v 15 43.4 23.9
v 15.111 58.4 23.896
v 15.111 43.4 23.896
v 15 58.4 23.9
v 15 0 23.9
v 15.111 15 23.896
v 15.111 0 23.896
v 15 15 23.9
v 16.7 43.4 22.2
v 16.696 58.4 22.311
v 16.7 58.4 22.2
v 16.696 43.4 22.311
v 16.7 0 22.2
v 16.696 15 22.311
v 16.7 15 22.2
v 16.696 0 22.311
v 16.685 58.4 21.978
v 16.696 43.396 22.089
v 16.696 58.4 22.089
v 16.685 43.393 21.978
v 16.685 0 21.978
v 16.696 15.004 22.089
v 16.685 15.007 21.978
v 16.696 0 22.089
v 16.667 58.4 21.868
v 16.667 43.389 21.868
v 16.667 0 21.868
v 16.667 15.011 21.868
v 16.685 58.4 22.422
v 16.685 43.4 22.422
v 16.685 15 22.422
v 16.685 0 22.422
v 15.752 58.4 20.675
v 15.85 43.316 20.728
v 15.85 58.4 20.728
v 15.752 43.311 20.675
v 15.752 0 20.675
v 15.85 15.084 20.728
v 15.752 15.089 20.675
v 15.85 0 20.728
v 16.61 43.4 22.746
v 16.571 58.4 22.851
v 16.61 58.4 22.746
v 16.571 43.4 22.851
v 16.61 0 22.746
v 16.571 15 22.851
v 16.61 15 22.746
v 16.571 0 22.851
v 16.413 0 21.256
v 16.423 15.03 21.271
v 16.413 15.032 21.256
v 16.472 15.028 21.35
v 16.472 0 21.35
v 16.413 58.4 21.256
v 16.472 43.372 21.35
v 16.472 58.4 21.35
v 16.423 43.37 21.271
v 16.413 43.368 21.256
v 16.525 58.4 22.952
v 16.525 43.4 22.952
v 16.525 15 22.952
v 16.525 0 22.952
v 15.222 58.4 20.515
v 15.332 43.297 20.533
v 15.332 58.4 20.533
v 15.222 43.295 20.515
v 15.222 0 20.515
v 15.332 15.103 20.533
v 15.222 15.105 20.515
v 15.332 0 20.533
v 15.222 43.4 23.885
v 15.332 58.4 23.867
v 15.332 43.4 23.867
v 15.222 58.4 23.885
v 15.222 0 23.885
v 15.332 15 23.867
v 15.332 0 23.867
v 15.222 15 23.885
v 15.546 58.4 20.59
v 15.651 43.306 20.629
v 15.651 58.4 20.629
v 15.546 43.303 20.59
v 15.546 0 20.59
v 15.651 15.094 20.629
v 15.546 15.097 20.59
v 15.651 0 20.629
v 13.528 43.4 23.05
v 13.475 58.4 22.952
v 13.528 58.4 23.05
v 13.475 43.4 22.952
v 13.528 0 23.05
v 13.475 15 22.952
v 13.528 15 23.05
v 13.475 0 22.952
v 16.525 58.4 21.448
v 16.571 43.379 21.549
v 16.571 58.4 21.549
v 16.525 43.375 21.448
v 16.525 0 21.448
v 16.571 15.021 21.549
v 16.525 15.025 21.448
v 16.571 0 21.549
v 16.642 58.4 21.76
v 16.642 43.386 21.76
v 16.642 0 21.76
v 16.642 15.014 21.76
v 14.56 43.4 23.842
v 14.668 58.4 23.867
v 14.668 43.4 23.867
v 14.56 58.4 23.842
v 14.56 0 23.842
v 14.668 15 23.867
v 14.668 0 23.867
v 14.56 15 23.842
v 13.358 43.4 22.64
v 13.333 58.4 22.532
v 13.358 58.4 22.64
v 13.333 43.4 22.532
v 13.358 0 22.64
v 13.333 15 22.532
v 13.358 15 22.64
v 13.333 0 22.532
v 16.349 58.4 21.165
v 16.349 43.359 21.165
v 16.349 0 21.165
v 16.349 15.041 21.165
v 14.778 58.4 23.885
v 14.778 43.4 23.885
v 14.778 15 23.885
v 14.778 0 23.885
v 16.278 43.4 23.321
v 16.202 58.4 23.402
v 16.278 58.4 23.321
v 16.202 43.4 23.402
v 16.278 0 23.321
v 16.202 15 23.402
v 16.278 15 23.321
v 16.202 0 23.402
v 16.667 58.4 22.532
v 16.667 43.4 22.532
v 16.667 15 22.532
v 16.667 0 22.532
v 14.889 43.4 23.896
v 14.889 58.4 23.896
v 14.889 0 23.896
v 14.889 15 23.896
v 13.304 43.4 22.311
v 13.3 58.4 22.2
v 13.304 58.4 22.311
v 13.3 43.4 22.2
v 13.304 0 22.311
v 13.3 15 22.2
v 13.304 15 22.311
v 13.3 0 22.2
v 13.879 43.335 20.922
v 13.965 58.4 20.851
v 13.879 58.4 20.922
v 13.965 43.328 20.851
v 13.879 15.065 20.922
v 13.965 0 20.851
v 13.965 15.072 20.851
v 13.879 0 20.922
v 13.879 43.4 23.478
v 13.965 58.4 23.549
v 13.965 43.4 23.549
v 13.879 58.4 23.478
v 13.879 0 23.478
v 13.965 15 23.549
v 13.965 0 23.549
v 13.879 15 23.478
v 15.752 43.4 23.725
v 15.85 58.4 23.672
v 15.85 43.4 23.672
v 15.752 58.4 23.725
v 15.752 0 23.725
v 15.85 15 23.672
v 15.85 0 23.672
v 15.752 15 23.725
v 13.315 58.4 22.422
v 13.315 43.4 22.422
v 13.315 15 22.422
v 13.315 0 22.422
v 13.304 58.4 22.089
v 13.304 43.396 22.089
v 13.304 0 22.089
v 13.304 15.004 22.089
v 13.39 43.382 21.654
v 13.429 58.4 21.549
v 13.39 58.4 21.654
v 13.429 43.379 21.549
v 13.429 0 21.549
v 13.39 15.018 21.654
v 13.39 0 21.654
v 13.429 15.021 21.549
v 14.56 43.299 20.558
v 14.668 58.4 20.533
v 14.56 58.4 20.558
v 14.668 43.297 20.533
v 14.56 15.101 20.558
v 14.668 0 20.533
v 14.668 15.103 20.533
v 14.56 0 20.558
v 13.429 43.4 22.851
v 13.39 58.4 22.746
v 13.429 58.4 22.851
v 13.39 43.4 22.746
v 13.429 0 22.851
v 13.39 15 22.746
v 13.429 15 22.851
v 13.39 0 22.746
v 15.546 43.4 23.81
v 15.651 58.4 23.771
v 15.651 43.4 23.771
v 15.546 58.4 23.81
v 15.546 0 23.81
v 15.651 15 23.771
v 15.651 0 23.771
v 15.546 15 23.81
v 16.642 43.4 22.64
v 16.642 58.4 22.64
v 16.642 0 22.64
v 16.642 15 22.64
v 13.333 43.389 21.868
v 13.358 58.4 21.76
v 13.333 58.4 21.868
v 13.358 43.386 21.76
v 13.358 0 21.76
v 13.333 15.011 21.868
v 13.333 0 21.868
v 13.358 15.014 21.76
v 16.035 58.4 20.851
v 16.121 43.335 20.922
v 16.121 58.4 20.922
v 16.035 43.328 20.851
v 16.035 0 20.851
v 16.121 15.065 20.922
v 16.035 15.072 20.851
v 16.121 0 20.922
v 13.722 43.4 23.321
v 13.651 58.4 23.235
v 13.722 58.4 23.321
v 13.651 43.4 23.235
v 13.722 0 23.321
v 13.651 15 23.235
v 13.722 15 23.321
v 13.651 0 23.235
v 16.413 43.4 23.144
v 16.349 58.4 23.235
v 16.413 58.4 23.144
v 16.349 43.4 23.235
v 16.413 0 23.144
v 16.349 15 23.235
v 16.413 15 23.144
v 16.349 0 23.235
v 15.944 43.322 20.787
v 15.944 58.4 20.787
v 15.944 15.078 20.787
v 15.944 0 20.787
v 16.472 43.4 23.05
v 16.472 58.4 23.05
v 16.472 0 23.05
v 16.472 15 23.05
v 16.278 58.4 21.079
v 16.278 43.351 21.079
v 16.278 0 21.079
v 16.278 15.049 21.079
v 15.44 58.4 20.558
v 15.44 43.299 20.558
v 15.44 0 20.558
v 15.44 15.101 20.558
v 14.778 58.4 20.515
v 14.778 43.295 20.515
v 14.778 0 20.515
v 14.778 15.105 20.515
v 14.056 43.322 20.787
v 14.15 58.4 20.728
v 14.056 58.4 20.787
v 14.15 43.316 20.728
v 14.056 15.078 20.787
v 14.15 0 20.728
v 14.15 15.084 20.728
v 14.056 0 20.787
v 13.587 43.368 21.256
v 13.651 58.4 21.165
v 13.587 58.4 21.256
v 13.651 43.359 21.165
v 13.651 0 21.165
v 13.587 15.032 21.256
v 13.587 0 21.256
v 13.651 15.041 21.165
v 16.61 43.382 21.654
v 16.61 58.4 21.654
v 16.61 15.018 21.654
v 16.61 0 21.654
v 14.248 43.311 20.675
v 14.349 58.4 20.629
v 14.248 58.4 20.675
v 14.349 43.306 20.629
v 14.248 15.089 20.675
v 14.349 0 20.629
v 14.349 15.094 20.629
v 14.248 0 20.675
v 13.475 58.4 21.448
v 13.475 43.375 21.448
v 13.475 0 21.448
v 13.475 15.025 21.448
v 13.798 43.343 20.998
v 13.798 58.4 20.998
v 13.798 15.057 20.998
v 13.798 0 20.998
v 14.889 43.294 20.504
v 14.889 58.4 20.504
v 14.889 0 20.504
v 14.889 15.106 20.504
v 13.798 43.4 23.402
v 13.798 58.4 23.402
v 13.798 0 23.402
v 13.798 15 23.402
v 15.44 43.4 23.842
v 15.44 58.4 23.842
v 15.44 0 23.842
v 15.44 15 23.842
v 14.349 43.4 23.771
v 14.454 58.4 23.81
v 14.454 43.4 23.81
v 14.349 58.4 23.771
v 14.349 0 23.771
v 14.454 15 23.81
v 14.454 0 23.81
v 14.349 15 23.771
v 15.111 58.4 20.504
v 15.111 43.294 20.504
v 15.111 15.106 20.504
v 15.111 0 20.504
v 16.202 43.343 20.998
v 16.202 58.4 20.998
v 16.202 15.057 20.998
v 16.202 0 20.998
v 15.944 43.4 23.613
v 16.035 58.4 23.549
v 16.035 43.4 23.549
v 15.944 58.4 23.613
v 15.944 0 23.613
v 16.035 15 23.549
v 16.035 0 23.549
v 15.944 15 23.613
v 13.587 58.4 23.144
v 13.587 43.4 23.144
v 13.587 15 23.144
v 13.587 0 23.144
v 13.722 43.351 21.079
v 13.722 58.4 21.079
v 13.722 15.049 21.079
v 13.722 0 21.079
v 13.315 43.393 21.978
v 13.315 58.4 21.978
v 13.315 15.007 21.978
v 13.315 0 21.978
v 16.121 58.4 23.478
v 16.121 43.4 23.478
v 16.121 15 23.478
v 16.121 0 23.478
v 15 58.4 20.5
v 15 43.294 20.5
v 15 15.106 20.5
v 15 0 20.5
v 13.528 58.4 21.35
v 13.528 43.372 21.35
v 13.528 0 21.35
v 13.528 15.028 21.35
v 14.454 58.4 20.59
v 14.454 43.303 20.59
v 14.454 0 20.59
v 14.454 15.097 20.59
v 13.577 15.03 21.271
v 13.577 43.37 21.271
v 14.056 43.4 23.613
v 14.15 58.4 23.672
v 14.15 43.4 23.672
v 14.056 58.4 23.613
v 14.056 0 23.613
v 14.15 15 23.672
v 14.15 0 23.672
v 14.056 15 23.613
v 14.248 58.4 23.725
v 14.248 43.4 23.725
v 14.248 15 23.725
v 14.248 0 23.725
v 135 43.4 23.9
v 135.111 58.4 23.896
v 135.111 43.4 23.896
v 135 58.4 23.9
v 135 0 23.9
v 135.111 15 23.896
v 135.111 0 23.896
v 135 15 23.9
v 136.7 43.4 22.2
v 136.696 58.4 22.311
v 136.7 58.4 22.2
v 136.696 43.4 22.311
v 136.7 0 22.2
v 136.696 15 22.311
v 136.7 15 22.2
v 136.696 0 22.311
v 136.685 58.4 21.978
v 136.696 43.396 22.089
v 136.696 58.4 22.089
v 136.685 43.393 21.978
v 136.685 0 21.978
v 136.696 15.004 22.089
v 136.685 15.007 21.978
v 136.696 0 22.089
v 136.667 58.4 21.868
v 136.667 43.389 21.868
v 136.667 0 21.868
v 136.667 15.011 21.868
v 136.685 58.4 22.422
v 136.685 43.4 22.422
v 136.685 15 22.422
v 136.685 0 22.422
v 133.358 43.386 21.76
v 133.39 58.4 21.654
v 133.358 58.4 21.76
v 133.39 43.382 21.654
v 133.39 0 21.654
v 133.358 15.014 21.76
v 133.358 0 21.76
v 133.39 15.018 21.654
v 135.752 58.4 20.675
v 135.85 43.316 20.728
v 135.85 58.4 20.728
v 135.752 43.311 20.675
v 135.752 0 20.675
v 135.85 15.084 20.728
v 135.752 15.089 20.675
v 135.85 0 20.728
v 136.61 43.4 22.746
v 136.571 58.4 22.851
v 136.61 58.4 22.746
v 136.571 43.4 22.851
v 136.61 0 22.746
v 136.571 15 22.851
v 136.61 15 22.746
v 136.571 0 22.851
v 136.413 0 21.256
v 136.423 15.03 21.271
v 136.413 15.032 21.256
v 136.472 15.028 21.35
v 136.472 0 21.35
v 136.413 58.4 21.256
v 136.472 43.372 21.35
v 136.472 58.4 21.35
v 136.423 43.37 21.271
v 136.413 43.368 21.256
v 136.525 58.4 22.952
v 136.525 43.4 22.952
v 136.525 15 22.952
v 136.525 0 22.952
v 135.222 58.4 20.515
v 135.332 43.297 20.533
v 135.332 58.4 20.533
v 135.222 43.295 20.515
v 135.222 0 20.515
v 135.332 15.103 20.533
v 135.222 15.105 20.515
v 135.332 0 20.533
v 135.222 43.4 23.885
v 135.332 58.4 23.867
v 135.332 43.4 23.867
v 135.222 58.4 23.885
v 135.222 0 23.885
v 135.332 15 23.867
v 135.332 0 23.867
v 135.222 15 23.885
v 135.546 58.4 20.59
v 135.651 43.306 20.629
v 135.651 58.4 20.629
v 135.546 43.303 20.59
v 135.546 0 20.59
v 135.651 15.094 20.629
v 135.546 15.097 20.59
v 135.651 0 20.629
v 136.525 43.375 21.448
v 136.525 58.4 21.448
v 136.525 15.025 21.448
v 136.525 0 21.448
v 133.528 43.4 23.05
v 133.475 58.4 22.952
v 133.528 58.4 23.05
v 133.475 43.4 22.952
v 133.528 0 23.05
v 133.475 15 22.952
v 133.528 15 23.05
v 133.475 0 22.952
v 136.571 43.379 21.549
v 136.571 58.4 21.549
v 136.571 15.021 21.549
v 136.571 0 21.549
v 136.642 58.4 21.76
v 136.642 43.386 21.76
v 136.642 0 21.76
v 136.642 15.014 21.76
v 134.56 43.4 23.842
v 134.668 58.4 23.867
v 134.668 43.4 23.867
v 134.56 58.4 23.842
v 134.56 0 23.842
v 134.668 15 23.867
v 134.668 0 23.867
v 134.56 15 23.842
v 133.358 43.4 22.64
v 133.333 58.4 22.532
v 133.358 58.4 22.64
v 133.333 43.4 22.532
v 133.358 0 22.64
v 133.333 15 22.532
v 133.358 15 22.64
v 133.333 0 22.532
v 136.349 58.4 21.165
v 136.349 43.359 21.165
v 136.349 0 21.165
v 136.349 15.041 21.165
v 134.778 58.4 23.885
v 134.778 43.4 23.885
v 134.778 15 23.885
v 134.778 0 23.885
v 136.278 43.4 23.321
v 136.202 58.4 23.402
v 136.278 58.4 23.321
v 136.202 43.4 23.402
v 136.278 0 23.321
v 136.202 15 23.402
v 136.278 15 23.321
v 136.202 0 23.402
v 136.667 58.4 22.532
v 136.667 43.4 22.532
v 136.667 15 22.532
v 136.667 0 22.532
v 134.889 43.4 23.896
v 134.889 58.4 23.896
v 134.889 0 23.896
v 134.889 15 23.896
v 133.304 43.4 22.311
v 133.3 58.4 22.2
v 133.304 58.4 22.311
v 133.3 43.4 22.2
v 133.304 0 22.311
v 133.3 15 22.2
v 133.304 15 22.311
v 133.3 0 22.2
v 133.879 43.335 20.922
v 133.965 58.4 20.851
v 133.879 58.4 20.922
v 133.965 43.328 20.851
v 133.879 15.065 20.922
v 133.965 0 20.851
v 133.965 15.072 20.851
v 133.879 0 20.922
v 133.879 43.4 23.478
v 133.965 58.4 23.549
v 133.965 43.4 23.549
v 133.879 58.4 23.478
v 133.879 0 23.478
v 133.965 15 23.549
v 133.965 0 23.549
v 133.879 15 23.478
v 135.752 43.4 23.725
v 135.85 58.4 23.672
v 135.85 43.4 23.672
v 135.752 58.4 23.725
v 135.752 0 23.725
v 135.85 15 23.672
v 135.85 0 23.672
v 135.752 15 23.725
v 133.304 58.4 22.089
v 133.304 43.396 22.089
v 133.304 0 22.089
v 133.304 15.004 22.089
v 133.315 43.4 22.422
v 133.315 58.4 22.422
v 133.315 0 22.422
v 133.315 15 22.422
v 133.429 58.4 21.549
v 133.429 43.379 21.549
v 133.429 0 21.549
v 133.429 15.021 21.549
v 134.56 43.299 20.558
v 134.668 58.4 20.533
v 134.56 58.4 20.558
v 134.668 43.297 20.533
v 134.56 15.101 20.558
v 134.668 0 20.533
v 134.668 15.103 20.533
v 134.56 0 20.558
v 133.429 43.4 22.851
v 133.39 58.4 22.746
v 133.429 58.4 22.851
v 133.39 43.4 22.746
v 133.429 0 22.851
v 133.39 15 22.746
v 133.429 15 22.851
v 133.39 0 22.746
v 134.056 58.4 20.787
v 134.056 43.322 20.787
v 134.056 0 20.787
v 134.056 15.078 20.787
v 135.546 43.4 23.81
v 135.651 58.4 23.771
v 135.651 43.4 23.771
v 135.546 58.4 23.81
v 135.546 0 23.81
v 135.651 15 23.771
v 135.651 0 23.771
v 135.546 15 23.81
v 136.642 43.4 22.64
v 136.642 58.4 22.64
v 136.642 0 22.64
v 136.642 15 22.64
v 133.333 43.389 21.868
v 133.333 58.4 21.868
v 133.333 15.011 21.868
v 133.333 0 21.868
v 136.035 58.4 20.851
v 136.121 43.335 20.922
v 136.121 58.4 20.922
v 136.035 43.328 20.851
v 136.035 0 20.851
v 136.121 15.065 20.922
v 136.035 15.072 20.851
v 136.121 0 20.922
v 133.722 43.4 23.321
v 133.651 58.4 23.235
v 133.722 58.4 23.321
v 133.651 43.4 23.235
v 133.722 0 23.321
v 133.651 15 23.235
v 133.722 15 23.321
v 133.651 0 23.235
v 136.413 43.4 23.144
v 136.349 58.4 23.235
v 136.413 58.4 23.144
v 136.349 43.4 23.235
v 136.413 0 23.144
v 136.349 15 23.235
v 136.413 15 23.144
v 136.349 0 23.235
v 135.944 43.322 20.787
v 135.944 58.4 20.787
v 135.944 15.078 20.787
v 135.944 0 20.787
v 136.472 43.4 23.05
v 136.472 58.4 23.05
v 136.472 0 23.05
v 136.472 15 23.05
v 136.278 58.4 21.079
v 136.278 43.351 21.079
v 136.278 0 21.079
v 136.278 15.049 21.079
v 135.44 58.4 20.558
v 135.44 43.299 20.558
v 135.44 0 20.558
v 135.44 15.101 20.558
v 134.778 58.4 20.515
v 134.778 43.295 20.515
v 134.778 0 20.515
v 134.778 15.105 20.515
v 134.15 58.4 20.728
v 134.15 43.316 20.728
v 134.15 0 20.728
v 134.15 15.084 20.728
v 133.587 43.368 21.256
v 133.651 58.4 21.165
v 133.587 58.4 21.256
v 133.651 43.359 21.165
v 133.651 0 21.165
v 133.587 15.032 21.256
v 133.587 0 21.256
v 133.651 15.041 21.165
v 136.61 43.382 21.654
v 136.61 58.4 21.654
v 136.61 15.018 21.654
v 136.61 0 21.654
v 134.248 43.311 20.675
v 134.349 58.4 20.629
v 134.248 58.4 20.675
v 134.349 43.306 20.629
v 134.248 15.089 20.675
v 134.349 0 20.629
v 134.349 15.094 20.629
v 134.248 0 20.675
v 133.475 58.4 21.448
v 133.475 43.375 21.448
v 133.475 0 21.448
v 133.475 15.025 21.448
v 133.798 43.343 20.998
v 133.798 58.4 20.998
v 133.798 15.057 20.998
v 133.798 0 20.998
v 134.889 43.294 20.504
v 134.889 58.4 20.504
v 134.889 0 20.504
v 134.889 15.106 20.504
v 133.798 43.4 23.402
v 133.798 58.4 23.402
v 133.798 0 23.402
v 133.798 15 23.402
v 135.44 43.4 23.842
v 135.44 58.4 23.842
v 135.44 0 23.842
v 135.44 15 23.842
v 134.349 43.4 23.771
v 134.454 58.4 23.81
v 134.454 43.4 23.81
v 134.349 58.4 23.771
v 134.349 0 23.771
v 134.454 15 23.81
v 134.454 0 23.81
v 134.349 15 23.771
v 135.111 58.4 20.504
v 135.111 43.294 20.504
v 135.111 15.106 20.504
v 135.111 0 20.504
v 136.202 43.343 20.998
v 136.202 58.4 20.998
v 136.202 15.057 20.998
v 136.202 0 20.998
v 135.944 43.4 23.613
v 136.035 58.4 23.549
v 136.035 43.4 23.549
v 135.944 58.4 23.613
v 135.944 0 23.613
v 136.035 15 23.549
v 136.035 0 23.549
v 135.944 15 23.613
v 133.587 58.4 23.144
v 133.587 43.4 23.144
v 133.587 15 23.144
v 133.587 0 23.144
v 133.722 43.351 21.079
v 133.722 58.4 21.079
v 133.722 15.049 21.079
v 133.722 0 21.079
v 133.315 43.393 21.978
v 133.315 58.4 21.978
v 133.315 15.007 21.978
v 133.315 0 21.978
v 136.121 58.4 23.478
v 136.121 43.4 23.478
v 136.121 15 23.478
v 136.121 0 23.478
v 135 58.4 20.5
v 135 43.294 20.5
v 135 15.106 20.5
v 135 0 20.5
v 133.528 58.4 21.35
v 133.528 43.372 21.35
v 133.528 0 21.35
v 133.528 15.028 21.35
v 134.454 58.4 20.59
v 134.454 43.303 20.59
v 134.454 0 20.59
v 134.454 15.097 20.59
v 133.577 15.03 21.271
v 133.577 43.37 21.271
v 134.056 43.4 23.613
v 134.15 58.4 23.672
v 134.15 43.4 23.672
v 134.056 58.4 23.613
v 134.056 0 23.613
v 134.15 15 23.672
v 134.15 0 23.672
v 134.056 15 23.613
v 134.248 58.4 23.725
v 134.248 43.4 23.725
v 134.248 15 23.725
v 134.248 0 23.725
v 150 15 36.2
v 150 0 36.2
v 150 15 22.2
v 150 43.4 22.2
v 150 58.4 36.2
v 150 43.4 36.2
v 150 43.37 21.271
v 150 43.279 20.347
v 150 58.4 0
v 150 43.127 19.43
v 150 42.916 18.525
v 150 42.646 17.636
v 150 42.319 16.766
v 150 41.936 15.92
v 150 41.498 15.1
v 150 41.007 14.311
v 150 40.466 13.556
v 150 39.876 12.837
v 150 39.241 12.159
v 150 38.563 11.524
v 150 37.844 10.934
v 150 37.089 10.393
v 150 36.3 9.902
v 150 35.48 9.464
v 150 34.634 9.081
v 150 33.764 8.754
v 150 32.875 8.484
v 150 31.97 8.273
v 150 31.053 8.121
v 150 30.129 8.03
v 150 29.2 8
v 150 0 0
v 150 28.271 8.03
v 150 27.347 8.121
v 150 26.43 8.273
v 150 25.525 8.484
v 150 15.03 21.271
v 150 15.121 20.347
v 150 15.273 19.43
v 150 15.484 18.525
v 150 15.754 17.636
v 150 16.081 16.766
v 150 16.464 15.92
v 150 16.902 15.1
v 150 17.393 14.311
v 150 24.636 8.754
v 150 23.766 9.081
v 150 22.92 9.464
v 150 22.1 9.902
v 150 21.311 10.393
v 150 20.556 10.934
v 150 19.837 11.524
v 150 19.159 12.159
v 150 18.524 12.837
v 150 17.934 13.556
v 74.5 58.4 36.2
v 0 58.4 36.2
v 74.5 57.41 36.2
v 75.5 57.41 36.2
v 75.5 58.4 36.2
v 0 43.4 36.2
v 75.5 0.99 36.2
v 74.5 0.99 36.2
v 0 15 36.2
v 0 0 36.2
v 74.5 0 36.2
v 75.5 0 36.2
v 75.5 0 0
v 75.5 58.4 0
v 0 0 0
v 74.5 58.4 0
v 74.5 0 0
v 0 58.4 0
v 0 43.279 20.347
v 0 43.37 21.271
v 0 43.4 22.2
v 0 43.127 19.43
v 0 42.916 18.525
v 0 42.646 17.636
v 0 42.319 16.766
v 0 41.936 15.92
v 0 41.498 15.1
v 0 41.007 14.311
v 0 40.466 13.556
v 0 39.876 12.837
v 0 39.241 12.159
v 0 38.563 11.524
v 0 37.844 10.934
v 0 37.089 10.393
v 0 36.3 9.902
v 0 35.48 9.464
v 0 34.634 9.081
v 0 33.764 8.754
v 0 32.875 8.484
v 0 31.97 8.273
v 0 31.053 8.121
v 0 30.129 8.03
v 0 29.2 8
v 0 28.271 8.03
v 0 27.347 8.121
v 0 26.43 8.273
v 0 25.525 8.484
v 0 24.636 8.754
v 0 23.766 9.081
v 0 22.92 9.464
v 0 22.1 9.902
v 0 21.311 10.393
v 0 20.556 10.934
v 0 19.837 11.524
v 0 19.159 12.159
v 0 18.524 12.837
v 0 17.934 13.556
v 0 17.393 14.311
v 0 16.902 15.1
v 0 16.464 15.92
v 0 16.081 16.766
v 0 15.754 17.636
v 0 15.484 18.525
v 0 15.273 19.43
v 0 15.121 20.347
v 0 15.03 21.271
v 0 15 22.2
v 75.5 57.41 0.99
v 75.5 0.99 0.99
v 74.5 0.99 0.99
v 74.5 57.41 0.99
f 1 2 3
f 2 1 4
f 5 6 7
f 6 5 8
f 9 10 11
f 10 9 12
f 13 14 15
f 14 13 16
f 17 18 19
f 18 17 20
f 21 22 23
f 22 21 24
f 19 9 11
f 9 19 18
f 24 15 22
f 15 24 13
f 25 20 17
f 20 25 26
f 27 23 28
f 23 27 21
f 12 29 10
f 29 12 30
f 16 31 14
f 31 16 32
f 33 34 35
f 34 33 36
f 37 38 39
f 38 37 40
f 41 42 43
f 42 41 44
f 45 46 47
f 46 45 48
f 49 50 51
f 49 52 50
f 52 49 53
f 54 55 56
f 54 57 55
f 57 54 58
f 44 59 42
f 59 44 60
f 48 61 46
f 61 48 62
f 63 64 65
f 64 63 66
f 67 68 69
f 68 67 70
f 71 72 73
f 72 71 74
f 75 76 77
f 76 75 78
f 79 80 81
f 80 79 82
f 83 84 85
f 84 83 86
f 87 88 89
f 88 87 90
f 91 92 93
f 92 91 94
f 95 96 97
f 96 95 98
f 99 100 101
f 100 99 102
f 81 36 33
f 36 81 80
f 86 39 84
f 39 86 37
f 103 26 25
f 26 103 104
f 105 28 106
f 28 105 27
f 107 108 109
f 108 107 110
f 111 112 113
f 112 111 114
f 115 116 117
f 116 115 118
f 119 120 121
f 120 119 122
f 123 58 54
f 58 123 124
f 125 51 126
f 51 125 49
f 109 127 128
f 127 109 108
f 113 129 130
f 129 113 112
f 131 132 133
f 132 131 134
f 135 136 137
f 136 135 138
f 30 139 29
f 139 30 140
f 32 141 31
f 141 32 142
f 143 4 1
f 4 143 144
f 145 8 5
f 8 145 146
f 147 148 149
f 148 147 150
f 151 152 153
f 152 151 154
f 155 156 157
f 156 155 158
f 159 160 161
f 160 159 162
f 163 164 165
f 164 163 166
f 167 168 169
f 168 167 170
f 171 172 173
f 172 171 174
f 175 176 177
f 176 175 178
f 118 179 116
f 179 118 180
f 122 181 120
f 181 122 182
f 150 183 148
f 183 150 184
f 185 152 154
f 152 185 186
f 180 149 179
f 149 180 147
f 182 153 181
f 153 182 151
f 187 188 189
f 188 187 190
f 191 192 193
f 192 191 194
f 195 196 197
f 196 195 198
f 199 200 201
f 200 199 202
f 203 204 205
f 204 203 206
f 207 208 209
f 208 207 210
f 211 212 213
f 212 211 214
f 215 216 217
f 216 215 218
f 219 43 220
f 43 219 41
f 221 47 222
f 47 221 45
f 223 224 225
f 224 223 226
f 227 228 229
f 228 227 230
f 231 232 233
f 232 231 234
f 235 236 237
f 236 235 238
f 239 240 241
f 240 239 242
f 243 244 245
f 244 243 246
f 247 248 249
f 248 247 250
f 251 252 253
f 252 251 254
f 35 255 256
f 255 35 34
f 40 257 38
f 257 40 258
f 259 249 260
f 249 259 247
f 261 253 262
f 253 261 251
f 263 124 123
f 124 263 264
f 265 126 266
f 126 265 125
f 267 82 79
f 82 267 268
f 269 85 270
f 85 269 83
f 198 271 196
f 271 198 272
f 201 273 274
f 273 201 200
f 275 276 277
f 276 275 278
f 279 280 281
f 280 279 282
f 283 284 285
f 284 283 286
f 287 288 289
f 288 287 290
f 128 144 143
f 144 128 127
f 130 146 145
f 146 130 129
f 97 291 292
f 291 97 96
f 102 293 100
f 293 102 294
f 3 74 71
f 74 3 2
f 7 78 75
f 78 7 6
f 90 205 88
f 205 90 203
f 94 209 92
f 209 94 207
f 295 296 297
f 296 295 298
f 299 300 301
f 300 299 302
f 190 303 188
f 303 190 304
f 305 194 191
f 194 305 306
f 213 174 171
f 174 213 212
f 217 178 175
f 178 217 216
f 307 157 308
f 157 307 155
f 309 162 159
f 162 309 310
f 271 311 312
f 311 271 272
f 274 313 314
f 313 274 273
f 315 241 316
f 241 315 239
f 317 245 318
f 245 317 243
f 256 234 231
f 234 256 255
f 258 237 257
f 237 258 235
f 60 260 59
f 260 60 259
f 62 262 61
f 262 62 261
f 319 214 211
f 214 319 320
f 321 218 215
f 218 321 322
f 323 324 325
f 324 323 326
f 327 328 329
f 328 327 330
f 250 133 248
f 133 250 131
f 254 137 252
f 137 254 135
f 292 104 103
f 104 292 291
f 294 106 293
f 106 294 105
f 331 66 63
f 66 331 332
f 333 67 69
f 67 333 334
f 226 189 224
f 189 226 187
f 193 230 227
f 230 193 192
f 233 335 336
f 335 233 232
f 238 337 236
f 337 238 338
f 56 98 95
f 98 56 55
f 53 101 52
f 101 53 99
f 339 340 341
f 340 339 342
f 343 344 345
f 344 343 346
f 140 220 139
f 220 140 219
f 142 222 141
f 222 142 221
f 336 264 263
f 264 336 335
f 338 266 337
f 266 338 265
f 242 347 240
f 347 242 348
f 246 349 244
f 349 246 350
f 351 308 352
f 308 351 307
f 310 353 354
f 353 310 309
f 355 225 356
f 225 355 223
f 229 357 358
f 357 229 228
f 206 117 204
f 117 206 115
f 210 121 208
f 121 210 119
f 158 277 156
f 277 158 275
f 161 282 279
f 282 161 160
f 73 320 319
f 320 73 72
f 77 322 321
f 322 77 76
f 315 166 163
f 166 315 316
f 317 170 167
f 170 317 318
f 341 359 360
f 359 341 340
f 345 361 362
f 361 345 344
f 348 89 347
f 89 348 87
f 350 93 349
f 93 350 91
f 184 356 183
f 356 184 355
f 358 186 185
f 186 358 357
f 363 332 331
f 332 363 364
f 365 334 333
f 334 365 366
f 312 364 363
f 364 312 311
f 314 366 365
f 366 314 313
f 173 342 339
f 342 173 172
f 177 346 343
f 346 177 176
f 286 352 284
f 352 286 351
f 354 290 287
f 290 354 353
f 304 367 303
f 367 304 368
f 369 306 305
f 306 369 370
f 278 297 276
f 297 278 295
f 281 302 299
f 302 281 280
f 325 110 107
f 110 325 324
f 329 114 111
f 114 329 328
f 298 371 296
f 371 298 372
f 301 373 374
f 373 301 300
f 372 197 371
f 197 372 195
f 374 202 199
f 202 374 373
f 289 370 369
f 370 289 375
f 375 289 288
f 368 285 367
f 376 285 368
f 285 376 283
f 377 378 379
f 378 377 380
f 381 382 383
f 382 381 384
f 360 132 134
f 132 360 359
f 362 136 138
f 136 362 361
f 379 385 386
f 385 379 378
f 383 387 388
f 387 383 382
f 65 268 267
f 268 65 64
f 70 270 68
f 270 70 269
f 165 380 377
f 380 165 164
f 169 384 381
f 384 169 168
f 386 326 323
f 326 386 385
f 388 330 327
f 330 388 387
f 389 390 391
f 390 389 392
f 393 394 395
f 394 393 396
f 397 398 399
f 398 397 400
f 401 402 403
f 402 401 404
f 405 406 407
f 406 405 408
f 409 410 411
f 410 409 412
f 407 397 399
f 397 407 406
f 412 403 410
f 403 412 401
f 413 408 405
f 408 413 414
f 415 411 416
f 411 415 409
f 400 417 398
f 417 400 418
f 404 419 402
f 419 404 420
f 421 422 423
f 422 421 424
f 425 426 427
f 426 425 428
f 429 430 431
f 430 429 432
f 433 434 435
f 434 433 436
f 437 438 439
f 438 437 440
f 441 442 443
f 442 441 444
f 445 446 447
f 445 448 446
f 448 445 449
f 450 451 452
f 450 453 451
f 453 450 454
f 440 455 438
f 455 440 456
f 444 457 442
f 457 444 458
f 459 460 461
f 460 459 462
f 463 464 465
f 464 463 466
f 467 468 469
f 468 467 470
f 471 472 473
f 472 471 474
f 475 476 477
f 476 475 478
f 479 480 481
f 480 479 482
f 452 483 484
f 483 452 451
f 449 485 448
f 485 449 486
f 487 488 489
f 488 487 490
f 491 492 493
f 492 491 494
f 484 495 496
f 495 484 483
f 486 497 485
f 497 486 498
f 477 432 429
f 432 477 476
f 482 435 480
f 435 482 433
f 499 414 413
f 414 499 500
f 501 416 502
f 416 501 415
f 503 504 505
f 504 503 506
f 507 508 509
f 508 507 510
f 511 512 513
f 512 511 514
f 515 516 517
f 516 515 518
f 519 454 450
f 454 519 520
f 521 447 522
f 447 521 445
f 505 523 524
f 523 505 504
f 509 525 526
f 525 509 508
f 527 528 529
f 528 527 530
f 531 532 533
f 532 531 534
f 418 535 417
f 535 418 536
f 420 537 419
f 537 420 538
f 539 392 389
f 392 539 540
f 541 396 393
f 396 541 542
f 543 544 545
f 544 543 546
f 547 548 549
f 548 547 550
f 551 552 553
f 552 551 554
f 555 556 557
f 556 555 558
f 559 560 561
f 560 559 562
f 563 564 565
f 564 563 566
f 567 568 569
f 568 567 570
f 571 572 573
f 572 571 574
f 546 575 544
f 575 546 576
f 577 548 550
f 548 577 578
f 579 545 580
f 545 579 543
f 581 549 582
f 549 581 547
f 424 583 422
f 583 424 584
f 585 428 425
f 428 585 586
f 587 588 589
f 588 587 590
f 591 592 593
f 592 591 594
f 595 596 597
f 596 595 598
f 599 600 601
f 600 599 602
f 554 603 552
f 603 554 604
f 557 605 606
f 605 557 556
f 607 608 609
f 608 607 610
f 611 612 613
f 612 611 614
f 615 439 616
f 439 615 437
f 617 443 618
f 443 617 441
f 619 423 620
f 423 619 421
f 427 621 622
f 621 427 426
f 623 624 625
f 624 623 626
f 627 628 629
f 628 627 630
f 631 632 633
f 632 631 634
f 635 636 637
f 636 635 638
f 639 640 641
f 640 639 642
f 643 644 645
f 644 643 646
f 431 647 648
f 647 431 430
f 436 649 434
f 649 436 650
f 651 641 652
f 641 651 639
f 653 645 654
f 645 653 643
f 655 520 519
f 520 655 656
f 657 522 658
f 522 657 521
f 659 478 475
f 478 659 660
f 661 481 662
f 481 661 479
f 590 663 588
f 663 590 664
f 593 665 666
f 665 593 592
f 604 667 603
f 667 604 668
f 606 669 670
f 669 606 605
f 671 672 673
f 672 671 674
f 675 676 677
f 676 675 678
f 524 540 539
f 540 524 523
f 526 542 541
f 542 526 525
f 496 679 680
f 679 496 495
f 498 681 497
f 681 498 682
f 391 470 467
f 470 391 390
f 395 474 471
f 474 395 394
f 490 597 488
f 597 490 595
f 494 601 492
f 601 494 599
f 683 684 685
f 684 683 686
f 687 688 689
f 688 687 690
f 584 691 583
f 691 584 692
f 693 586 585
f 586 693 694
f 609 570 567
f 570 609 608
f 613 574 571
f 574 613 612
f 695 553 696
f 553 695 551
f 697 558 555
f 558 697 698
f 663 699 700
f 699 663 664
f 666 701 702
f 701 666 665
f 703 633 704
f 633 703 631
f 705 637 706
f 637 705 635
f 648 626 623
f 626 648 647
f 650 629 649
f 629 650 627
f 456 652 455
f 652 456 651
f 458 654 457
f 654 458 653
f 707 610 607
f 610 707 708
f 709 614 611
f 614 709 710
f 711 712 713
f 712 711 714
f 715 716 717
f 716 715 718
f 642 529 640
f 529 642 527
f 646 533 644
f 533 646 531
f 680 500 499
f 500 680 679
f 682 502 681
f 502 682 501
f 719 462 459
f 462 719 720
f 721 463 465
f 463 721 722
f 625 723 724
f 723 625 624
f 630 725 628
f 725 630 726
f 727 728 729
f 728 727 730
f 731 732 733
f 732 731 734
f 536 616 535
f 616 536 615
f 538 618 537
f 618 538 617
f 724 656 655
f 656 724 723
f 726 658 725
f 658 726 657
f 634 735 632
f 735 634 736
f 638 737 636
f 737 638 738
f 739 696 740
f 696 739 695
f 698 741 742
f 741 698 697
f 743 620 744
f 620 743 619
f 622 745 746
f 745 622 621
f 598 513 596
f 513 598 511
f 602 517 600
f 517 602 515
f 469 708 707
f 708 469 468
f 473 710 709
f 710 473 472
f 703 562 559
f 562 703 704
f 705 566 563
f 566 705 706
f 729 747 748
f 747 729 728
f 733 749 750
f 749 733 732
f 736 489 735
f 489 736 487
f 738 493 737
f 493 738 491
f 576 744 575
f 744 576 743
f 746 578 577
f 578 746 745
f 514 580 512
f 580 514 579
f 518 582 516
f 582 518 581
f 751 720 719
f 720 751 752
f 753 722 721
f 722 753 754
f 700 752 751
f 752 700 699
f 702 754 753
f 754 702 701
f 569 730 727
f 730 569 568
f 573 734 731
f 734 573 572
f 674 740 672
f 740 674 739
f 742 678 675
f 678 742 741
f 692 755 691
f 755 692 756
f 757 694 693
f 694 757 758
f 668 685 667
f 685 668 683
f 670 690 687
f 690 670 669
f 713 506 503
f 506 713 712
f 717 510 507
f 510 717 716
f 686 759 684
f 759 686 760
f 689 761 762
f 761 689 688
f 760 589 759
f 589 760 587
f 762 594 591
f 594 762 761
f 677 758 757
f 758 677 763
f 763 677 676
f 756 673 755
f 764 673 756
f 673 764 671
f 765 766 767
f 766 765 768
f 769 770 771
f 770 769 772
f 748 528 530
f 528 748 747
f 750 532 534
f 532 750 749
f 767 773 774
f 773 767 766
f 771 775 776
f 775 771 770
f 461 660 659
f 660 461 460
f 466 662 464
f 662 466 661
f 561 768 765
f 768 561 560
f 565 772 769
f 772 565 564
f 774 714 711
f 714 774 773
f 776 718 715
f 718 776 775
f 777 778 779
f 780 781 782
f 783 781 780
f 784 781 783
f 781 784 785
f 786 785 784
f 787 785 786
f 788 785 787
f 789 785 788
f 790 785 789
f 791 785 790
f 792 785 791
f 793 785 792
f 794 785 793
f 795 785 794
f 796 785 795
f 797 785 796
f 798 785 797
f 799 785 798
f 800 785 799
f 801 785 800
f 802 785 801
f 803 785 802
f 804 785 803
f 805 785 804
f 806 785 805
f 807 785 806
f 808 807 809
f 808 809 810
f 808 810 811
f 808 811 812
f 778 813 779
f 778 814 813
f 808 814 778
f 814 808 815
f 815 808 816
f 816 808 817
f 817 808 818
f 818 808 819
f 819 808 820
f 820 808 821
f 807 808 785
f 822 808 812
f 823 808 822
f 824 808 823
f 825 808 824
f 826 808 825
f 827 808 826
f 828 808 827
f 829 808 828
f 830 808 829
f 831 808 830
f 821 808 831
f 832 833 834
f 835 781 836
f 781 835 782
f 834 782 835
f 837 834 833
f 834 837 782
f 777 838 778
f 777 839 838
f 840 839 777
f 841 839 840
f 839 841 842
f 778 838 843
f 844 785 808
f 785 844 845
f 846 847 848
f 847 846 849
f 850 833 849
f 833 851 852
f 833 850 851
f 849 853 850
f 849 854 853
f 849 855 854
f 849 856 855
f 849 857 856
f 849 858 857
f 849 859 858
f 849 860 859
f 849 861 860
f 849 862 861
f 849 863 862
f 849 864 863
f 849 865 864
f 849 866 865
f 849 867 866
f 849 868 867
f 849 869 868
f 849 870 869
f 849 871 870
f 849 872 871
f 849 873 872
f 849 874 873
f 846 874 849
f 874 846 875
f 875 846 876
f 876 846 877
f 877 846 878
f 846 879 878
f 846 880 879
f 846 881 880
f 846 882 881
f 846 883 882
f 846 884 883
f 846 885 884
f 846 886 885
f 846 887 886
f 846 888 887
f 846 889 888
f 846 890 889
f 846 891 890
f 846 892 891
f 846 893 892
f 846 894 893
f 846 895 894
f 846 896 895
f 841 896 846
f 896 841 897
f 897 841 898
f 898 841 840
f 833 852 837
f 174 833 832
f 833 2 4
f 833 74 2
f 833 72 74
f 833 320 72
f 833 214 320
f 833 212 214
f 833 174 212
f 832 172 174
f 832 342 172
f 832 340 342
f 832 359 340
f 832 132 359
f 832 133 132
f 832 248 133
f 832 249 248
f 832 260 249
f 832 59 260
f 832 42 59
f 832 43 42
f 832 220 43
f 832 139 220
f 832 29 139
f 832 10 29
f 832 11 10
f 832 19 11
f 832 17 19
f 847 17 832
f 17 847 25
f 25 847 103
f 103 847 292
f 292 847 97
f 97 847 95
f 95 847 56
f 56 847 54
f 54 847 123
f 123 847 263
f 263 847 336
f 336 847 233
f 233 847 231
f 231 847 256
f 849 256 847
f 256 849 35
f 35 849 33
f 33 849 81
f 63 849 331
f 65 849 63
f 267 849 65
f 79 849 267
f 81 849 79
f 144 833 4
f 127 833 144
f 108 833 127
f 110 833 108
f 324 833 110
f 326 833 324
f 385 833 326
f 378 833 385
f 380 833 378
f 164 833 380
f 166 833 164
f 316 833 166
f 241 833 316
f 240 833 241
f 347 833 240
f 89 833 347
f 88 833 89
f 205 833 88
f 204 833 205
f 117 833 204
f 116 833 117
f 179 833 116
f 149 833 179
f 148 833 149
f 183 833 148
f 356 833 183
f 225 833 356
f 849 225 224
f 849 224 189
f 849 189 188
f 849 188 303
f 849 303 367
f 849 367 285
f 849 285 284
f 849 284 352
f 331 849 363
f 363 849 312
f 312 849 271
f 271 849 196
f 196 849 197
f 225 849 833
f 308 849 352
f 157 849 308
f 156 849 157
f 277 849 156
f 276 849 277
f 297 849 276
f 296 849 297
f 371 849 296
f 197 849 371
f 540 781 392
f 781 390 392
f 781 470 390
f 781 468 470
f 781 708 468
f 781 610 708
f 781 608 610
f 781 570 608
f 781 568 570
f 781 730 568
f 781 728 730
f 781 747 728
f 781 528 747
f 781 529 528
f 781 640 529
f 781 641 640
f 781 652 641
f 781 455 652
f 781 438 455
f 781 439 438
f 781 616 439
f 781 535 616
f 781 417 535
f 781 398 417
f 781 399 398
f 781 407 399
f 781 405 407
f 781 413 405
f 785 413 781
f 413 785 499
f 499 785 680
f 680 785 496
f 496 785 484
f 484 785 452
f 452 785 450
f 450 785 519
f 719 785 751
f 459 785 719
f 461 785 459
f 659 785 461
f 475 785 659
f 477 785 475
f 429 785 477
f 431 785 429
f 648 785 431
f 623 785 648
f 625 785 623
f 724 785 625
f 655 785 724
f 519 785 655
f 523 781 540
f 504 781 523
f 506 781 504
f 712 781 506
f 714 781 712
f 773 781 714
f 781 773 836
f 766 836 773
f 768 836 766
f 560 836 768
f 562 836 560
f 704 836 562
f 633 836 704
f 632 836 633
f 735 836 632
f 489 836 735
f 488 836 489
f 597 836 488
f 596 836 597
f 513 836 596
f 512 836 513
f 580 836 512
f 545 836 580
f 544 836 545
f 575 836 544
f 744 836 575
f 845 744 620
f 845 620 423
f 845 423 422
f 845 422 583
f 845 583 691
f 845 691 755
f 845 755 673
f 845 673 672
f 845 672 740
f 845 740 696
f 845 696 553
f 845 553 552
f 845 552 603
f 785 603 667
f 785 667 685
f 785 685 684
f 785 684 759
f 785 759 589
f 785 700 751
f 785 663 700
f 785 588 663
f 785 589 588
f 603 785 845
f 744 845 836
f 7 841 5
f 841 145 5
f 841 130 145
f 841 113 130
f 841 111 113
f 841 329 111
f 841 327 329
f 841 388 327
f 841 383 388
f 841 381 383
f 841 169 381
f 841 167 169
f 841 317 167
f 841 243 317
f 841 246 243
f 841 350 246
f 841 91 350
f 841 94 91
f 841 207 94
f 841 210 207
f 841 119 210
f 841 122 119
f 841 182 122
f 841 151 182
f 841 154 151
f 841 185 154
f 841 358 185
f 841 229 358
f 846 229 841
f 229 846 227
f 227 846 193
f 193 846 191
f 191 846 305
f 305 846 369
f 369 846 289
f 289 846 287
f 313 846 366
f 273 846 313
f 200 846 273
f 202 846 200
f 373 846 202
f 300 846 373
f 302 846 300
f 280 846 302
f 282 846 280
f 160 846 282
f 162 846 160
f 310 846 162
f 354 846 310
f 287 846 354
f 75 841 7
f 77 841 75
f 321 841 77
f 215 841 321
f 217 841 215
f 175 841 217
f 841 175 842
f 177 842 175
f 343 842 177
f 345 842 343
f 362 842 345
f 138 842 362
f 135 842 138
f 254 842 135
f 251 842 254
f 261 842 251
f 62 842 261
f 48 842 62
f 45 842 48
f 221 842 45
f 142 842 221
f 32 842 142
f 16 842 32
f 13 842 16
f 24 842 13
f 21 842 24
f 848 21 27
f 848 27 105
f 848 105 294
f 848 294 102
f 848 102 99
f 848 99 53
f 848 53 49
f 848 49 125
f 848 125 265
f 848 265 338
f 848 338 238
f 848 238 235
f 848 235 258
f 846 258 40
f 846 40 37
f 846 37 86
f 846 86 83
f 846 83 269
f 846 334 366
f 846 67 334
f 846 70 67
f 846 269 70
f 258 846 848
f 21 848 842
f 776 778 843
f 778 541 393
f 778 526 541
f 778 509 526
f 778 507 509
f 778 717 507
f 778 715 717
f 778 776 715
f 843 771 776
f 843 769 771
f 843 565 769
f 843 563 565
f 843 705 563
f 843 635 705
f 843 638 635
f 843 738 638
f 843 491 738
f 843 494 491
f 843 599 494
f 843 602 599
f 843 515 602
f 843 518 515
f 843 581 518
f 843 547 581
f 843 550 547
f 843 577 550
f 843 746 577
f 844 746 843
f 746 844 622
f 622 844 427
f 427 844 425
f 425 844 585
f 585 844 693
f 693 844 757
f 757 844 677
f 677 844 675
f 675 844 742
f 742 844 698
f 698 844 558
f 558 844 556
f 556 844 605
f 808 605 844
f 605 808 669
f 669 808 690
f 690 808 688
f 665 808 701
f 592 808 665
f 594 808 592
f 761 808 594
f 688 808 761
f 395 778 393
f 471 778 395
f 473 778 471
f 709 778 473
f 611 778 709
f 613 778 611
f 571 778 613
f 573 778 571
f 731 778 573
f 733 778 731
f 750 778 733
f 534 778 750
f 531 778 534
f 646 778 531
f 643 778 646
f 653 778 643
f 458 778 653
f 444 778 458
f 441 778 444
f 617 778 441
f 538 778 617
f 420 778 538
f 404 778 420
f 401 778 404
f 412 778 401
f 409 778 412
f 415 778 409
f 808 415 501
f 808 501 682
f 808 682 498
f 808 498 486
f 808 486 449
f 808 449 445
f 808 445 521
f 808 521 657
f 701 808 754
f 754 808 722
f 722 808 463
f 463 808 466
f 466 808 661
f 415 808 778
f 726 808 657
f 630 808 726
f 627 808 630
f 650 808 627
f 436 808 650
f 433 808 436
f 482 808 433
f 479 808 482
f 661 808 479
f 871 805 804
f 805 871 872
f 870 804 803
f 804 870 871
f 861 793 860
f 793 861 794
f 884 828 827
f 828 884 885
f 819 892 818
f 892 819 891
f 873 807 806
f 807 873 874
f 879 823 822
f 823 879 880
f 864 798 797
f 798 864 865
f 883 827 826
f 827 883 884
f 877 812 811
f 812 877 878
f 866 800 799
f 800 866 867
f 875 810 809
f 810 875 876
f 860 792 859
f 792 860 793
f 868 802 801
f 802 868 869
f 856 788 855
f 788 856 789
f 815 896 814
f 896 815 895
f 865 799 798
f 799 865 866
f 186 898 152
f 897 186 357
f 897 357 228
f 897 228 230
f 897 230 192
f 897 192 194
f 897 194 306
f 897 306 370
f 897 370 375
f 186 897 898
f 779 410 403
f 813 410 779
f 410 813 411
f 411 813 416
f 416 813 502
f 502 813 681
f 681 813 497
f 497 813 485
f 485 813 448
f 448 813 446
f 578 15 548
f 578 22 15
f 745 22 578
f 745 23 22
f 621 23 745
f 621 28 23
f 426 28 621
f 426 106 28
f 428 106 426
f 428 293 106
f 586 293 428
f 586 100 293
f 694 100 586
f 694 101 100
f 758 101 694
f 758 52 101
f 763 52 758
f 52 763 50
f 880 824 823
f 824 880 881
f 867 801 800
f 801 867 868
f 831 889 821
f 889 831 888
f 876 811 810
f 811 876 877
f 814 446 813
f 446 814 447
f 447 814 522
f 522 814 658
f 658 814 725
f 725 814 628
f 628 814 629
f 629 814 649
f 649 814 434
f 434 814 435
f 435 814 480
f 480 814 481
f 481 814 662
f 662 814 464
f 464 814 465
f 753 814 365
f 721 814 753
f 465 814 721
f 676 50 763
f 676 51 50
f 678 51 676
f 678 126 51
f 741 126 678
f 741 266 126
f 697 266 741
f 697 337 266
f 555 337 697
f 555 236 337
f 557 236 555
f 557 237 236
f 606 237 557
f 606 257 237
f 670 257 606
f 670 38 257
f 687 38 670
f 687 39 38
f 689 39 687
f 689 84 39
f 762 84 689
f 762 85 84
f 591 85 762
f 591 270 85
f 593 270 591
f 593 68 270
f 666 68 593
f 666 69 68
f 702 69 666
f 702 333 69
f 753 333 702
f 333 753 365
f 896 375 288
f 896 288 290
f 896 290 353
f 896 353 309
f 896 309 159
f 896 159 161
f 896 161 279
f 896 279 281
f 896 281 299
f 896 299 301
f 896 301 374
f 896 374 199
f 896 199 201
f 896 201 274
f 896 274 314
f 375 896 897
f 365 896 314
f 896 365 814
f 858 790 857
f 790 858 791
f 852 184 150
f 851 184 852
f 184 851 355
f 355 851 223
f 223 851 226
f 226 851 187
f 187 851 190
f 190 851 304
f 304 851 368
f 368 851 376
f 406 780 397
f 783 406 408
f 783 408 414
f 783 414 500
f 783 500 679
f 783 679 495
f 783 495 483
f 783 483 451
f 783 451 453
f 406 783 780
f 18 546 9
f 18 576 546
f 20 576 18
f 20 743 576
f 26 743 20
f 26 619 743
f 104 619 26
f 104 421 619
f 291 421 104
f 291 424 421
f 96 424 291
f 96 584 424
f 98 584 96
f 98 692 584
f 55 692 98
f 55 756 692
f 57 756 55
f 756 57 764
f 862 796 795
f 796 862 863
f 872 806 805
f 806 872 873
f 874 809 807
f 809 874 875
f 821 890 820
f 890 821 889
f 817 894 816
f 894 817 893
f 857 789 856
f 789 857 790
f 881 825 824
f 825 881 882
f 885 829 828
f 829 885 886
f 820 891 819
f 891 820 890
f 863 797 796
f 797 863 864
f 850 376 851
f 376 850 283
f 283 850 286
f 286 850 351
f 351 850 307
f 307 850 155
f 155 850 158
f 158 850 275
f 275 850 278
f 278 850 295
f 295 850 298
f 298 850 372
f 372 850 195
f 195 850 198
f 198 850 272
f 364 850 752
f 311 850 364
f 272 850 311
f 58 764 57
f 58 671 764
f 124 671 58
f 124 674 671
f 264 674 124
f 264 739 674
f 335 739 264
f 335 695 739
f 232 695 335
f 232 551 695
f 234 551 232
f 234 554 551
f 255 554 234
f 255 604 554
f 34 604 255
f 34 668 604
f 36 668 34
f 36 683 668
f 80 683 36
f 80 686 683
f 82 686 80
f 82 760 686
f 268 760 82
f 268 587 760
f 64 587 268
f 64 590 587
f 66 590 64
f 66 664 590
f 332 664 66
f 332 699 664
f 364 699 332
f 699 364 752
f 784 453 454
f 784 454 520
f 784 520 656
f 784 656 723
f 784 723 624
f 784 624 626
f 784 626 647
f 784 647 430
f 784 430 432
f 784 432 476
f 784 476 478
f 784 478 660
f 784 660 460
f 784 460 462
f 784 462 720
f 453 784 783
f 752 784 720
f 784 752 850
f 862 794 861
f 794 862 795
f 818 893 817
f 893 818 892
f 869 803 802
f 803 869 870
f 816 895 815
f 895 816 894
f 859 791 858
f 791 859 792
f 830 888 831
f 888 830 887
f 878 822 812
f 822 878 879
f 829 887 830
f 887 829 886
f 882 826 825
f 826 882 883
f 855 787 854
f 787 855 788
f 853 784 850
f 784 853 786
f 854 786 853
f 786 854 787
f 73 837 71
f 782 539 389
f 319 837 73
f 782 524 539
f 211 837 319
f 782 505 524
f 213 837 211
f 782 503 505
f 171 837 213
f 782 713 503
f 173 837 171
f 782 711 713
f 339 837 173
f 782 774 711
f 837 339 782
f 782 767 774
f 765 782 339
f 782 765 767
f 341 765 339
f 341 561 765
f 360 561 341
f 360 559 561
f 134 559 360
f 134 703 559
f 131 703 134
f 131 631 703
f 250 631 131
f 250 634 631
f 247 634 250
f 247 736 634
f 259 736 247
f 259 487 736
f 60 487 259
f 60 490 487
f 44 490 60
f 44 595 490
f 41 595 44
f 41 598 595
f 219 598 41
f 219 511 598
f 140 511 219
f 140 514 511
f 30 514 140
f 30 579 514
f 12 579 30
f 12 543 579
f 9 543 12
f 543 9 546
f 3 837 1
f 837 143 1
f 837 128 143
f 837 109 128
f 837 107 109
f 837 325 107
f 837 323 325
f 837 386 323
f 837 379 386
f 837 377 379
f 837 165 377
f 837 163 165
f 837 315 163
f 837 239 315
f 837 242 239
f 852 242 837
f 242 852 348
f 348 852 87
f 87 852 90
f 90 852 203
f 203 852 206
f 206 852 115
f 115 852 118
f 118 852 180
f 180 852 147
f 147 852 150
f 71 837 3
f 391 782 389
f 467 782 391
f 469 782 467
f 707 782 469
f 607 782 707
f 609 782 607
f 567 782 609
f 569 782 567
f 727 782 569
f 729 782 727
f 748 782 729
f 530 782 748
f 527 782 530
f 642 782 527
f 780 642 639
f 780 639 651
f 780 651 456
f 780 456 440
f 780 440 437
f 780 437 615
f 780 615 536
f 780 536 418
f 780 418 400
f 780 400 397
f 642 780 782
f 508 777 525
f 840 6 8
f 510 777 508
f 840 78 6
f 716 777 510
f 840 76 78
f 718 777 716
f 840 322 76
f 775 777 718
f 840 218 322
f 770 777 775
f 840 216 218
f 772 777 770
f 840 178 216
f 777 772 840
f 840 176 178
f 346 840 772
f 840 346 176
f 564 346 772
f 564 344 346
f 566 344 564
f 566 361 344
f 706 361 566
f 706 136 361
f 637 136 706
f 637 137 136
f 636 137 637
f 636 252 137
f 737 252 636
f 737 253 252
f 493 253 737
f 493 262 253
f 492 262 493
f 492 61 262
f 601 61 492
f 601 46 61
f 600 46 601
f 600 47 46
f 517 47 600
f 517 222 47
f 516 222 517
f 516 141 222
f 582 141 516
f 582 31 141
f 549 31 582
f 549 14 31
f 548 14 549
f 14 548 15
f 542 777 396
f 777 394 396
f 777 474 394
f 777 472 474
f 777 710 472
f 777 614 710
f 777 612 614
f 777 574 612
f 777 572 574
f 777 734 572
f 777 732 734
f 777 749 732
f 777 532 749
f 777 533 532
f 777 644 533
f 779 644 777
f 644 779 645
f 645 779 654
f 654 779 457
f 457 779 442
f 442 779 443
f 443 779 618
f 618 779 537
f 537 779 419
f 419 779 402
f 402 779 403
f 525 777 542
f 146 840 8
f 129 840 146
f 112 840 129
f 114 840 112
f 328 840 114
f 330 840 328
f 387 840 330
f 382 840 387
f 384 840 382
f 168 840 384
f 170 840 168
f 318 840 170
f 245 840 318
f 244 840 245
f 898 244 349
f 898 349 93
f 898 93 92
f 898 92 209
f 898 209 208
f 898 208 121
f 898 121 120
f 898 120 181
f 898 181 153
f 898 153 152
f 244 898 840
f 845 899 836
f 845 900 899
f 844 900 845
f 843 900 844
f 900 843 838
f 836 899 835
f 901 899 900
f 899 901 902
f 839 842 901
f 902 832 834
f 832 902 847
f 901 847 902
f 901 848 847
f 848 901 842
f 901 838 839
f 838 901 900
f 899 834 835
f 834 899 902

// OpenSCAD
// パイプ穴あけ治具（φ3 下穴ガイド）　3Dプリント用
// 単位 mm。パイプにかぶせ、前後の壁のガイド穴にφ3ドリルを通して、パイプの芯を貫通させる。
// 造形の向き：このまま（平らな面が下、溝が上向き）。サポート不要。

pipe_d  = 28;    // パイプ外径
fit     = 0.4;   // パイプとのすき間（きつい場合は増やす）
pitch   = 120;   // 穴ピッチ
guide_d = 3.4;   // ガイド穴径（φ3ドリル用。造形で小さくなる分を見込む）
wall    = 15;    // 前後の壁の厚み（＝ガイドの長さ）
top_t   = 8;     // 溝の底の厚み
end_m   = 15;    // 穴から端までの距離
$fn = 96;

r = (pipe_d + fit) / 2;
L = pitch + 2 * end_m;        // 全長 150
W = 2 * r + 2 * wall;         // 幅（穴あけ方向）
zc = top_t + r;               // パイプの芯の高さ
H = zc + pipe_d / 2;          // 高さ（パイプの下端まで）

difference() {
  cube([L, W, H]);
  // パイプが入る溝（底は半円、上は開放）
  translate([-1, W / 2, zc]) rotate([0, 90, 0]) cylinder(r = r, h = L + 2);
  translate([-1, W / 2 - r, zc]) cube([L + 2, 2 * r, H]);
  // ガイド穴（前後の壁を同軸で貫通）
  for (x = [end_m, end_m + pitch])
    translate([x, -1, zc]) rotate([-90, 0, 0]) cylinder(d = guide_d, h = W + 2);
  // 中心の合わせ線（外側3面）
  translate([L / 2 - 0.5, -1, -0.01]) cube([1, W + 2, 1]);
  translate([L / 2 - 0.5, -0.01, -1]) cube([1, 1, H + 2]);
  translate([L / 2 - 0.5, W - 0.99, -1]) cube([1, 1, H + 2]);
}
